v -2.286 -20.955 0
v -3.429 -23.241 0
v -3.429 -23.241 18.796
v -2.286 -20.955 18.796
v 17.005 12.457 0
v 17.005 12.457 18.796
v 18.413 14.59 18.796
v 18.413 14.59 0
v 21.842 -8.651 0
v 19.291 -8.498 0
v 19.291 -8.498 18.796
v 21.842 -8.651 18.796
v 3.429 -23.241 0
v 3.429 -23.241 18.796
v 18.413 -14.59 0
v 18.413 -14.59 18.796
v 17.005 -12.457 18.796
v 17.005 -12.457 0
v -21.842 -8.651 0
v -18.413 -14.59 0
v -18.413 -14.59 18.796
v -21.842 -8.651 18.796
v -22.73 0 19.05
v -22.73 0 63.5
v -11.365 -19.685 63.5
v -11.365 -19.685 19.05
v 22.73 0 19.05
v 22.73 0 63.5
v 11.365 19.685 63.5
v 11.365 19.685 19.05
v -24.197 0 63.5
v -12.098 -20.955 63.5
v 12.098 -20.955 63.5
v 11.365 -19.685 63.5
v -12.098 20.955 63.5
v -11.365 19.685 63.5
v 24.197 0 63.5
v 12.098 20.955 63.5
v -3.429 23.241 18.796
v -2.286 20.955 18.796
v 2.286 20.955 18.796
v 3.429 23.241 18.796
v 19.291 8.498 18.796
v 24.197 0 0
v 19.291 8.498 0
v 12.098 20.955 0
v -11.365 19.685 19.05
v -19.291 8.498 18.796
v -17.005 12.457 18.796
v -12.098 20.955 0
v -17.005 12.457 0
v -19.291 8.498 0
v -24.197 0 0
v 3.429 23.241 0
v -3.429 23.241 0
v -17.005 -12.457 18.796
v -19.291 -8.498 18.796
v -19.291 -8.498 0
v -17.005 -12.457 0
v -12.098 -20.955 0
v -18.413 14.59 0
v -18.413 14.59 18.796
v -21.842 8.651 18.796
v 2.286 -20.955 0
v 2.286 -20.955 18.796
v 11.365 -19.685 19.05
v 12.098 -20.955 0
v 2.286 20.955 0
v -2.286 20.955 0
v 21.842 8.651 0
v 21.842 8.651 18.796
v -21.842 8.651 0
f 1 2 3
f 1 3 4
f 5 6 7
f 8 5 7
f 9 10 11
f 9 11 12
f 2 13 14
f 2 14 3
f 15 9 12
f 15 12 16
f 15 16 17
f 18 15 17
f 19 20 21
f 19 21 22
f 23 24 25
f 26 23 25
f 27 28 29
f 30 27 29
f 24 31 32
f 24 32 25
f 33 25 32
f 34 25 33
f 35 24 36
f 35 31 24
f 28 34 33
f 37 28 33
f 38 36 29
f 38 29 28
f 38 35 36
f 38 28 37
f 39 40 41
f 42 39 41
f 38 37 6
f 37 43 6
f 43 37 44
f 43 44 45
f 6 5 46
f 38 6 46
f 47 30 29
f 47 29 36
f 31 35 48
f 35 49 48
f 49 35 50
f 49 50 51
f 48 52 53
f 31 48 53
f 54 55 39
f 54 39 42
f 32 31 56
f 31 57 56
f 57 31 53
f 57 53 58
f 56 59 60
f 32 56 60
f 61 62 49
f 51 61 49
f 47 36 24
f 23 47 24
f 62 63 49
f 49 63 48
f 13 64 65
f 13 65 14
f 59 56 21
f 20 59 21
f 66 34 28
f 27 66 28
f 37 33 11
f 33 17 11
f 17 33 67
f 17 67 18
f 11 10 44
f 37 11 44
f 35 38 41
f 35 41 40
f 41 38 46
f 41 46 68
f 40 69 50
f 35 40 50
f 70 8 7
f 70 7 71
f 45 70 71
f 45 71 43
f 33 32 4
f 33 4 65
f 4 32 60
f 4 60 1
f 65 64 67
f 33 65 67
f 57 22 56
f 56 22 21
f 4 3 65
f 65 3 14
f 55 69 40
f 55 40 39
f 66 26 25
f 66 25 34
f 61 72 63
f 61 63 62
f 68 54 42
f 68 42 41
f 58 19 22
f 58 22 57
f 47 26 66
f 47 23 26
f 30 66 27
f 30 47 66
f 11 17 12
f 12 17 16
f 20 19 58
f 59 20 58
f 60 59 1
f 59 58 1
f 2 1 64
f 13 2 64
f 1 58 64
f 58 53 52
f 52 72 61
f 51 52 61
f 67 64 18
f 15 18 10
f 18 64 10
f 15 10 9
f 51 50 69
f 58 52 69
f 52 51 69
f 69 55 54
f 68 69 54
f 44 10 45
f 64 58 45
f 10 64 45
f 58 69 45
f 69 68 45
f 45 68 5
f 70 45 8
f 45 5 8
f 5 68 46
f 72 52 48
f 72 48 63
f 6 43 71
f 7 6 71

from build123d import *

# Parameters (mm, degrees)
F1_DEPTH = 63.5
F3_DEPTH = 44.45
F5_DEPTH = 18.796


with BuildPart() as f1:
    # F0 (on Top) → F1 (new body)
    with BuildSketch(Plane.XY):
        Polygon((-12.0983748909, -20.955), (12.0983748909, -20.955), (24.1967497817, 0), (12.0983748909, 20.955), (-12.0983748909, 20.955), (-24.1967497817, 0), align=None)
    extrude(amount=F1_DEPTH)

    # F2 (on face) → F3 (cut)
    with BuildSketch(Plane.XY.offset(63.5)):
        Polygon((-11.365140049, -19.685), (11.365140049, -19.685), (22.730280098, 0), (11.365140049, 19.685), (-11.365140049, 19.685), (-22.730280098, 0), align=None)
    extrude(amount=-F3_DEPTH, mode=Mode.SUBTRACT)

    # F4 (on face) → F5 (join)
    with BuildSketch(Plane(origin=(0, 0, 0), x_dir=(1, 0, 0), z_dir=(0, 0, -1))):
        Polygon((-2.286, 20.955), (0, 20.955), (2.286, 20.955), (3.429, 23.241), (0, 23.241), (-3.429, 23.241), align=None)
        Polygon((-20.1272964094, 11.6205), (-18.1475623363, 10.4775), (-17.0045623363, 12.4572340731), (-18.4127964094, 14.5901011096), align=None)
        Polygon((-19.2905623363, 8.4977659269), (-18.1475623363, 10.4775), (-20.1272964094, 11.6205), (-21.8417964094, 8.6508988904), align=None)
        Polygon((-17.0045623363, -12.4572340731), (-18.1475623363, -10.4775), (-20.1272964094, -11.6205), (-18.4127964094, -14.5901011096), align=None)
        Polygon((-20.1272964094, -11.6205), (-18.1475623363, -10.4775), (-19.2905623363, -8.4977659269), (-21.8417964094, -8.6508988904), align=None)
        Polygon((0, -23.241), (0, -20.955), (-2.286, -20.955), (-3.429, -23.241), align=None)
        Polygon((2.286, -20.955), (0, -20.955), (0, -23.241), (3.429, -23.241), align=None)
        Polygon((19.2905623363, -8.4977659269), (18.1475623363, -10.4775), (17.0045623363, -12.4572340731), (18.4127964094, -14.5901011096), (20.1272964094, -11.6205), (21.8417964094, -8.6508988904), align=None)
        Polygon((17.0045623363, 12.4572340731), (18.1475623363, 10.4775), (19.2905623363, 8.4977659269), (21.8417964094, 8.6508988904), (20.1272964094, 11.6205), (18.4127964094, 14.5901011096), align=None)
    extrude(amount=-F5_DEPTH)


solid = f1.part
